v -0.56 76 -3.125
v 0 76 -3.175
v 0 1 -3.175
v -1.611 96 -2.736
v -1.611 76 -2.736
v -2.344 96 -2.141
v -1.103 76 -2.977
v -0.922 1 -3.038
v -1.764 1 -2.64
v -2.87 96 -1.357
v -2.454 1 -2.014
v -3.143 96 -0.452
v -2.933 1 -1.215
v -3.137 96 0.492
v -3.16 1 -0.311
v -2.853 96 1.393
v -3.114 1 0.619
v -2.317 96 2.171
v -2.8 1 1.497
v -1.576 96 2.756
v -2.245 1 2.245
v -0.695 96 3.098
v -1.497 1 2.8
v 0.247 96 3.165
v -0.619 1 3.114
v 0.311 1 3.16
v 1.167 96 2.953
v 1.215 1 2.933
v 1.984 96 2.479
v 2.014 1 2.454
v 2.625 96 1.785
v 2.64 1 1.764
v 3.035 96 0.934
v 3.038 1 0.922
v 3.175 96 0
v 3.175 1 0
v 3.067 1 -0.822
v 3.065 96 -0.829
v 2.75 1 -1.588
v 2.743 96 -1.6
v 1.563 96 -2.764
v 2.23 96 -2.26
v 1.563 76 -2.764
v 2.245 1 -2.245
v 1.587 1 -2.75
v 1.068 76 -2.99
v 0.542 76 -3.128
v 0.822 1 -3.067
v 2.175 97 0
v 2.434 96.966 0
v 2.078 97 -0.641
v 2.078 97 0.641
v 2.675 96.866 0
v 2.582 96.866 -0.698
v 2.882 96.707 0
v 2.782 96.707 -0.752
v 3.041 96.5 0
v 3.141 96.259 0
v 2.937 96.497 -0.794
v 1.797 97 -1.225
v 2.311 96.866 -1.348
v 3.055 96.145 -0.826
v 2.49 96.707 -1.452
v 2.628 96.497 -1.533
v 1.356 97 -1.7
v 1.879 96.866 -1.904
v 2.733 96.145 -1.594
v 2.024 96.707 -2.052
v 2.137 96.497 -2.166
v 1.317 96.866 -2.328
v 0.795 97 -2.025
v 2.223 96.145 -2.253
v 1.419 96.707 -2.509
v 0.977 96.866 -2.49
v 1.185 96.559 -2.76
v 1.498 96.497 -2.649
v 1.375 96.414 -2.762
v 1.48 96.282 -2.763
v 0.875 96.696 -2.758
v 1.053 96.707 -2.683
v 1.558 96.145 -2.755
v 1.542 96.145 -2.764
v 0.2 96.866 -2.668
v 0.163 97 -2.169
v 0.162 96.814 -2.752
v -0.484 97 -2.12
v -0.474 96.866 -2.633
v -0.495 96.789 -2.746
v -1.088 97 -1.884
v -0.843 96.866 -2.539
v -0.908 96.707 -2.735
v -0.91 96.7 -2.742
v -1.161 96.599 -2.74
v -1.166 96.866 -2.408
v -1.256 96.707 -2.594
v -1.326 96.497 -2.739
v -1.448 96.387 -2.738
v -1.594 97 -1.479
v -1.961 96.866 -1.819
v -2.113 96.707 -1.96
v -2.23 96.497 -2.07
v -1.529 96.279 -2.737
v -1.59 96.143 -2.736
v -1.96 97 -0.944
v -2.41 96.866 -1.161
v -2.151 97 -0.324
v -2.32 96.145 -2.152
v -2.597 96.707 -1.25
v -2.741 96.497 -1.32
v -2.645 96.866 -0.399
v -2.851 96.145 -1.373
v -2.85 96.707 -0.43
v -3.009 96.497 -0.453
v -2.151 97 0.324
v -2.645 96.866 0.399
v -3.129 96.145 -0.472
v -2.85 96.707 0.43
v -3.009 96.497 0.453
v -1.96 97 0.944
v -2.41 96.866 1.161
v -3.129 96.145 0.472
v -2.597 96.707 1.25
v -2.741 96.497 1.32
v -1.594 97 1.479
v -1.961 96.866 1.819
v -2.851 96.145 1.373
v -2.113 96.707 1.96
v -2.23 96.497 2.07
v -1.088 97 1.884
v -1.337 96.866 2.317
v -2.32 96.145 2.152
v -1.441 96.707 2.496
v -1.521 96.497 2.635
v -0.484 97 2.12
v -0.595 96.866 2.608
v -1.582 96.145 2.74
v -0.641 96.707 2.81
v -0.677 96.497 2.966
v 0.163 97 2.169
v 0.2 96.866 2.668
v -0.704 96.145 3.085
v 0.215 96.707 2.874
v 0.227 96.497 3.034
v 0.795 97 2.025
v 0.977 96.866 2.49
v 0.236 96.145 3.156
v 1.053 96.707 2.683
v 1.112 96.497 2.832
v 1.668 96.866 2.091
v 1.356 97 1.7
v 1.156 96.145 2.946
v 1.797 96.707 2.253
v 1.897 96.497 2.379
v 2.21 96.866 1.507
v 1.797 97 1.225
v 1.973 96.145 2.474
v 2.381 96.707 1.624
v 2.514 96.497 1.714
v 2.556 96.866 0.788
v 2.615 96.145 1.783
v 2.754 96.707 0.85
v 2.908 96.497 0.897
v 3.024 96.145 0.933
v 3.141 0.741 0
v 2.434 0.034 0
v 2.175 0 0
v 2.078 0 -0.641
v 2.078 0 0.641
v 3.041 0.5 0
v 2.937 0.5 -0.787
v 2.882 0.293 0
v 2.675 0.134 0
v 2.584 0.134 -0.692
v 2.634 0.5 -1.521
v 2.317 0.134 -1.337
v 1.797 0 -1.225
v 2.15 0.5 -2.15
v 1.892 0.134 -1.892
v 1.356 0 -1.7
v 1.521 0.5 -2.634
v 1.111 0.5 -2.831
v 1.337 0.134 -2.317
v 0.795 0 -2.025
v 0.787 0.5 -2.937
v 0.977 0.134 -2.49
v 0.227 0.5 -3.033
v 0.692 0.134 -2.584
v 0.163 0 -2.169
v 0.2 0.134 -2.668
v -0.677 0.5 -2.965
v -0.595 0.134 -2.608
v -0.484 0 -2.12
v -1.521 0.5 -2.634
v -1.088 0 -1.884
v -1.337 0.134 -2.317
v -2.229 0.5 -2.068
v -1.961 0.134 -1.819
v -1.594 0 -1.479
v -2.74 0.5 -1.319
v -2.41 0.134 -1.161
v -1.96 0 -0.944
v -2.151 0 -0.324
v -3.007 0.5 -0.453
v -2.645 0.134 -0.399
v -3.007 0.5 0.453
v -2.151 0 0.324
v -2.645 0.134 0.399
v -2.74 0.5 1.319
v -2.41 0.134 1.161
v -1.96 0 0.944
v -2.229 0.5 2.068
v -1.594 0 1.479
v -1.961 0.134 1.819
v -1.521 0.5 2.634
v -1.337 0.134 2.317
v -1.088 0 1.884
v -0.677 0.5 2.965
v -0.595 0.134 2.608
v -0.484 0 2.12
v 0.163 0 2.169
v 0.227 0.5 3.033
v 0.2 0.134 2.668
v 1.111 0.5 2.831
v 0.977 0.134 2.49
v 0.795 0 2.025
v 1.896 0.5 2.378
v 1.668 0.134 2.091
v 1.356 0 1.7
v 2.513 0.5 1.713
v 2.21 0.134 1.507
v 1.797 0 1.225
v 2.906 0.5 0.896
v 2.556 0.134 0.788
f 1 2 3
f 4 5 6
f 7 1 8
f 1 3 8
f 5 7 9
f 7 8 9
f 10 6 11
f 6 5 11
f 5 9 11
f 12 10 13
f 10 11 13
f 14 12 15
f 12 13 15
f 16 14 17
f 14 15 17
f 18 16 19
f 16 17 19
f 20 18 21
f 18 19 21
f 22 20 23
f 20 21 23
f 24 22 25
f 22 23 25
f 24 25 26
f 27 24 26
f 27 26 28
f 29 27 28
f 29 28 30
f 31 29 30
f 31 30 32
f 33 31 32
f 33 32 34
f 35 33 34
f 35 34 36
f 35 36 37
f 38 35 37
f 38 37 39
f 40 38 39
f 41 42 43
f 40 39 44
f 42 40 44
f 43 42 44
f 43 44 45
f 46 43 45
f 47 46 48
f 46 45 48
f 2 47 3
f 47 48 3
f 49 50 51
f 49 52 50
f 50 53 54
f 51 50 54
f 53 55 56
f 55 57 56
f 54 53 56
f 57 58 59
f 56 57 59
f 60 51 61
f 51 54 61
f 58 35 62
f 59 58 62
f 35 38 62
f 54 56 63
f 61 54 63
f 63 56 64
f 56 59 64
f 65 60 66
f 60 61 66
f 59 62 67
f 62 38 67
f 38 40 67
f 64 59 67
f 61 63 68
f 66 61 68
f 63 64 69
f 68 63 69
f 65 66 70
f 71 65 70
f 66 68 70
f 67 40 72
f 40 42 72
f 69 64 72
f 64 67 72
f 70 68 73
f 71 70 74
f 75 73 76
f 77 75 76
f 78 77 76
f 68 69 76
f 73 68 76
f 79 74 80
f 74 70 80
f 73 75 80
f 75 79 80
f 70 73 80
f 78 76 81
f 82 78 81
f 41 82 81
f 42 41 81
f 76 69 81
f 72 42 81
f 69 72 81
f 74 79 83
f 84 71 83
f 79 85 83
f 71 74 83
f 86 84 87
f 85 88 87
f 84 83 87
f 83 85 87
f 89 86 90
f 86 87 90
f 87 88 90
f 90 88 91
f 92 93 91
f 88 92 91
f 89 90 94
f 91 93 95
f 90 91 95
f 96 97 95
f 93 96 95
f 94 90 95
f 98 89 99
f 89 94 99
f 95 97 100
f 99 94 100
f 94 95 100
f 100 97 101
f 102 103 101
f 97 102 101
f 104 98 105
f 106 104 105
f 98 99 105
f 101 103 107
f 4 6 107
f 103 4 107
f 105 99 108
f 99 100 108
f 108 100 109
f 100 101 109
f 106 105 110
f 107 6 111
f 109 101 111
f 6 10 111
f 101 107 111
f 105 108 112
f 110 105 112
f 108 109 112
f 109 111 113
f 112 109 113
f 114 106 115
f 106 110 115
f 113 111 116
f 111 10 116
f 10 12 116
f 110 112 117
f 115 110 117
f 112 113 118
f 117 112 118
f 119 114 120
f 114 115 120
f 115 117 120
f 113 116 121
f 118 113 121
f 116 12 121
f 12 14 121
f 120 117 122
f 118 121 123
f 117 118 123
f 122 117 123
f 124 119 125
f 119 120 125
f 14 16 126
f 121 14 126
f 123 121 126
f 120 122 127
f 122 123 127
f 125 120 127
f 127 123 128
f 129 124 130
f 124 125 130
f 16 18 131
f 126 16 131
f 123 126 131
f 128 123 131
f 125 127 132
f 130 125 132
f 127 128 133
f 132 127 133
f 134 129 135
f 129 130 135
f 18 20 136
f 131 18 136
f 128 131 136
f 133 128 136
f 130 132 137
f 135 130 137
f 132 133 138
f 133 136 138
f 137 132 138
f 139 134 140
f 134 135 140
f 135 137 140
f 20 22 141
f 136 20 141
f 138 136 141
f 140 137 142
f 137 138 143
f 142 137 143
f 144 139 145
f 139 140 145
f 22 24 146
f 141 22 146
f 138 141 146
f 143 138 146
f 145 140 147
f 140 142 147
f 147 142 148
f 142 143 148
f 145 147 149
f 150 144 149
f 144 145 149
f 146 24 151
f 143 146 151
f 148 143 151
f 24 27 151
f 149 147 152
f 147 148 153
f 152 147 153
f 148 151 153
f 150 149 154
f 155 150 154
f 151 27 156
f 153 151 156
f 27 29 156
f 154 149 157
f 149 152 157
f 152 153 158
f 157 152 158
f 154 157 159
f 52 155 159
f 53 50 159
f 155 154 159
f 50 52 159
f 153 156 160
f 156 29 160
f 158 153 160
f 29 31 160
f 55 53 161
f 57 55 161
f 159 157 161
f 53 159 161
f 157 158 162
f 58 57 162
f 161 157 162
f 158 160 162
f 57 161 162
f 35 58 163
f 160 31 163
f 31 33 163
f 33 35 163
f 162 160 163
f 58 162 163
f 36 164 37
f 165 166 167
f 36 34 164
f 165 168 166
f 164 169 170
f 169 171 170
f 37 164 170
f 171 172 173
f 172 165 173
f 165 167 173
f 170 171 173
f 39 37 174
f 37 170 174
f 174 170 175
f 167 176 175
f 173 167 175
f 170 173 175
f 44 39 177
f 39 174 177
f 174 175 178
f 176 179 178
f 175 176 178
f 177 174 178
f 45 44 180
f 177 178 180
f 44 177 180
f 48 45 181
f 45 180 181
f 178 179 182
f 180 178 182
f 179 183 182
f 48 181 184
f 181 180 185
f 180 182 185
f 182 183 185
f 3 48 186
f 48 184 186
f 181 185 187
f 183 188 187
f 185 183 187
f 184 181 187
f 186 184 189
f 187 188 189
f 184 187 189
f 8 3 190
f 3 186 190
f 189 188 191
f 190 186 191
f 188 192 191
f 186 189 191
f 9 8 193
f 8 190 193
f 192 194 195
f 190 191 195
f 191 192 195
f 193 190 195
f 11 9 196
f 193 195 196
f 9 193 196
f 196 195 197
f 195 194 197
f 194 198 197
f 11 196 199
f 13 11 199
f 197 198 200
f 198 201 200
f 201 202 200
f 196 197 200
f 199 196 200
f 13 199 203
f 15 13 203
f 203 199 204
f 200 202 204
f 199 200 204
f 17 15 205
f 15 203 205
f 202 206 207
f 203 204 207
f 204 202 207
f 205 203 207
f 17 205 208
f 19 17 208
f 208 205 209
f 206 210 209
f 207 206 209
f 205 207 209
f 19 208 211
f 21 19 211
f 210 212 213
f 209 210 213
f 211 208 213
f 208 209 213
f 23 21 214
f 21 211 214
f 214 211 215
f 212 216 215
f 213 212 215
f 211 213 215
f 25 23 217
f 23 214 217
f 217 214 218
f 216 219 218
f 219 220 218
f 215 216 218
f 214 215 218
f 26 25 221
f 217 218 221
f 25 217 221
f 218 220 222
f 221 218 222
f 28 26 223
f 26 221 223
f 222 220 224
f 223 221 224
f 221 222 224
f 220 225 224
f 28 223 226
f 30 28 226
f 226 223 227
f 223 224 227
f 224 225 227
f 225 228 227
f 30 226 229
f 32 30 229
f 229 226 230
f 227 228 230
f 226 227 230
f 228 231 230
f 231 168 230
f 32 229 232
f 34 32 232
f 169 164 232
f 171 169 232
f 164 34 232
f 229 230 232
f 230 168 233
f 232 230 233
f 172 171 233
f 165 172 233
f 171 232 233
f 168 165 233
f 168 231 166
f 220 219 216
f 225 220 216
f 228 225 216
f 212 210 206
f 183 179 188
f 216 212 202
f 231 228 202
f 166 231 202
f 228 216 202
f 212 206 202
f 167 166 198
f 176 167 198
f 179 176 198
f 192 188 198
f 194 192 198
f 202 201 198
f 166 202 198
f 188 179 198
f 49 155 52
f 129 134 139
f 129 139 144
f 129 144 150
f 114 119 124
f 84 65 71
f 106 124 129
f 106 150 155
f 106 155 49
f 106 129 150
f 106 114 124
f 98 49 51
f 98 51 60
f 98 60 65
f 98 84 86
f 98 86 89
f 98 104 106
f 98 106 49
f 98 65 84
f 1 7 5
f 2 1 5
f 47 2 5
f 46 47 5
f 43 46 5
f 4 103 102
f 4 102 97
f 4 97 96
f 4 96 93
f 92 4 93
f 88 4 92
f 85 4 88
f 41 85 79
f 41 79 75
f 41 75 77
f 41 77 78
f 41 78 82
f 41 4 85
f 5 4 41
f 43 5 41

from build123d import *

# Parameters (mm, degrees)
SKETCH1_R               = 3.175
BOSS_EXTRUDE1_DEPTH     = 97
CUT_EXTRUDE1_DEPTH      = 98.103868358
CUT_EXTRUDE1_DEPTH_BACK = 21


with BuildPart() as part:
    # Sketch1 → Boss-Extrude1 (new body)
    with BuildSketch(Plane(origin=(0, 0, 0), x_dir=(1, 0, 0), z_dir=(0, 1, 0))):
        with Locations(Location((0, 0, 0), (0, 0, 90))):
            Circle(SKETCH1_R)
    extrude(amount=BOSS_EXTRUDE1_DEPTH)

    # Sketch2 → Cut-Extrude1 (cut, two sides: drawn at the far end of the back side and taken through both)
    with BuildSketch(Plane(origin=(0, 97, 0), x_dir=(1, 0, 0), z_dir=(0, 1, 0)).offset(-CUT_EXTRUDE1_DEPTH_BACK)):
        Polygon((-26.82080565, 2.517016971), (-1.610698227, 2.736106032), (1.562902146, 2.763686285), (26.773009569, 2.982775346), (26.334831446, 53.402990191), (-27.258983772, 52.937231816), align=None)
    extrude(amount=CUT_EXTRUDE1_DEPTH + CUT_EXTRUDE1_DEPTH_BACK, mode=Mode.SUBTRACT)

    # Fillet1: read off the stored shape, not the designer's step
    # Fillet1 outline → Fillet1 (revolve, cut)
    with BuildSketch(Plane.XY):
        with BuildLine():
            ThreePointArc((3.175, 1), (2.882106781, 0.292893219), (2.175, 0))
            Line((2.175, 0), (3.175, 0))
            Line((3.175, 0), (3.175, 1))
        make_face()
        with BuildLine():
            ThreePointArc((2.175, 97), (2.882106781, 96.707106781), (3.175, 96))
            Line((3.175, 96), (3.175, 97))
            Line((3.175, 97), (2.175, 97))
        make_face()
    revolve(axis=Axis((0, 0, 0), (0, 1, 0)), mode=Mode.SUBTRACT)


solid = part.part
